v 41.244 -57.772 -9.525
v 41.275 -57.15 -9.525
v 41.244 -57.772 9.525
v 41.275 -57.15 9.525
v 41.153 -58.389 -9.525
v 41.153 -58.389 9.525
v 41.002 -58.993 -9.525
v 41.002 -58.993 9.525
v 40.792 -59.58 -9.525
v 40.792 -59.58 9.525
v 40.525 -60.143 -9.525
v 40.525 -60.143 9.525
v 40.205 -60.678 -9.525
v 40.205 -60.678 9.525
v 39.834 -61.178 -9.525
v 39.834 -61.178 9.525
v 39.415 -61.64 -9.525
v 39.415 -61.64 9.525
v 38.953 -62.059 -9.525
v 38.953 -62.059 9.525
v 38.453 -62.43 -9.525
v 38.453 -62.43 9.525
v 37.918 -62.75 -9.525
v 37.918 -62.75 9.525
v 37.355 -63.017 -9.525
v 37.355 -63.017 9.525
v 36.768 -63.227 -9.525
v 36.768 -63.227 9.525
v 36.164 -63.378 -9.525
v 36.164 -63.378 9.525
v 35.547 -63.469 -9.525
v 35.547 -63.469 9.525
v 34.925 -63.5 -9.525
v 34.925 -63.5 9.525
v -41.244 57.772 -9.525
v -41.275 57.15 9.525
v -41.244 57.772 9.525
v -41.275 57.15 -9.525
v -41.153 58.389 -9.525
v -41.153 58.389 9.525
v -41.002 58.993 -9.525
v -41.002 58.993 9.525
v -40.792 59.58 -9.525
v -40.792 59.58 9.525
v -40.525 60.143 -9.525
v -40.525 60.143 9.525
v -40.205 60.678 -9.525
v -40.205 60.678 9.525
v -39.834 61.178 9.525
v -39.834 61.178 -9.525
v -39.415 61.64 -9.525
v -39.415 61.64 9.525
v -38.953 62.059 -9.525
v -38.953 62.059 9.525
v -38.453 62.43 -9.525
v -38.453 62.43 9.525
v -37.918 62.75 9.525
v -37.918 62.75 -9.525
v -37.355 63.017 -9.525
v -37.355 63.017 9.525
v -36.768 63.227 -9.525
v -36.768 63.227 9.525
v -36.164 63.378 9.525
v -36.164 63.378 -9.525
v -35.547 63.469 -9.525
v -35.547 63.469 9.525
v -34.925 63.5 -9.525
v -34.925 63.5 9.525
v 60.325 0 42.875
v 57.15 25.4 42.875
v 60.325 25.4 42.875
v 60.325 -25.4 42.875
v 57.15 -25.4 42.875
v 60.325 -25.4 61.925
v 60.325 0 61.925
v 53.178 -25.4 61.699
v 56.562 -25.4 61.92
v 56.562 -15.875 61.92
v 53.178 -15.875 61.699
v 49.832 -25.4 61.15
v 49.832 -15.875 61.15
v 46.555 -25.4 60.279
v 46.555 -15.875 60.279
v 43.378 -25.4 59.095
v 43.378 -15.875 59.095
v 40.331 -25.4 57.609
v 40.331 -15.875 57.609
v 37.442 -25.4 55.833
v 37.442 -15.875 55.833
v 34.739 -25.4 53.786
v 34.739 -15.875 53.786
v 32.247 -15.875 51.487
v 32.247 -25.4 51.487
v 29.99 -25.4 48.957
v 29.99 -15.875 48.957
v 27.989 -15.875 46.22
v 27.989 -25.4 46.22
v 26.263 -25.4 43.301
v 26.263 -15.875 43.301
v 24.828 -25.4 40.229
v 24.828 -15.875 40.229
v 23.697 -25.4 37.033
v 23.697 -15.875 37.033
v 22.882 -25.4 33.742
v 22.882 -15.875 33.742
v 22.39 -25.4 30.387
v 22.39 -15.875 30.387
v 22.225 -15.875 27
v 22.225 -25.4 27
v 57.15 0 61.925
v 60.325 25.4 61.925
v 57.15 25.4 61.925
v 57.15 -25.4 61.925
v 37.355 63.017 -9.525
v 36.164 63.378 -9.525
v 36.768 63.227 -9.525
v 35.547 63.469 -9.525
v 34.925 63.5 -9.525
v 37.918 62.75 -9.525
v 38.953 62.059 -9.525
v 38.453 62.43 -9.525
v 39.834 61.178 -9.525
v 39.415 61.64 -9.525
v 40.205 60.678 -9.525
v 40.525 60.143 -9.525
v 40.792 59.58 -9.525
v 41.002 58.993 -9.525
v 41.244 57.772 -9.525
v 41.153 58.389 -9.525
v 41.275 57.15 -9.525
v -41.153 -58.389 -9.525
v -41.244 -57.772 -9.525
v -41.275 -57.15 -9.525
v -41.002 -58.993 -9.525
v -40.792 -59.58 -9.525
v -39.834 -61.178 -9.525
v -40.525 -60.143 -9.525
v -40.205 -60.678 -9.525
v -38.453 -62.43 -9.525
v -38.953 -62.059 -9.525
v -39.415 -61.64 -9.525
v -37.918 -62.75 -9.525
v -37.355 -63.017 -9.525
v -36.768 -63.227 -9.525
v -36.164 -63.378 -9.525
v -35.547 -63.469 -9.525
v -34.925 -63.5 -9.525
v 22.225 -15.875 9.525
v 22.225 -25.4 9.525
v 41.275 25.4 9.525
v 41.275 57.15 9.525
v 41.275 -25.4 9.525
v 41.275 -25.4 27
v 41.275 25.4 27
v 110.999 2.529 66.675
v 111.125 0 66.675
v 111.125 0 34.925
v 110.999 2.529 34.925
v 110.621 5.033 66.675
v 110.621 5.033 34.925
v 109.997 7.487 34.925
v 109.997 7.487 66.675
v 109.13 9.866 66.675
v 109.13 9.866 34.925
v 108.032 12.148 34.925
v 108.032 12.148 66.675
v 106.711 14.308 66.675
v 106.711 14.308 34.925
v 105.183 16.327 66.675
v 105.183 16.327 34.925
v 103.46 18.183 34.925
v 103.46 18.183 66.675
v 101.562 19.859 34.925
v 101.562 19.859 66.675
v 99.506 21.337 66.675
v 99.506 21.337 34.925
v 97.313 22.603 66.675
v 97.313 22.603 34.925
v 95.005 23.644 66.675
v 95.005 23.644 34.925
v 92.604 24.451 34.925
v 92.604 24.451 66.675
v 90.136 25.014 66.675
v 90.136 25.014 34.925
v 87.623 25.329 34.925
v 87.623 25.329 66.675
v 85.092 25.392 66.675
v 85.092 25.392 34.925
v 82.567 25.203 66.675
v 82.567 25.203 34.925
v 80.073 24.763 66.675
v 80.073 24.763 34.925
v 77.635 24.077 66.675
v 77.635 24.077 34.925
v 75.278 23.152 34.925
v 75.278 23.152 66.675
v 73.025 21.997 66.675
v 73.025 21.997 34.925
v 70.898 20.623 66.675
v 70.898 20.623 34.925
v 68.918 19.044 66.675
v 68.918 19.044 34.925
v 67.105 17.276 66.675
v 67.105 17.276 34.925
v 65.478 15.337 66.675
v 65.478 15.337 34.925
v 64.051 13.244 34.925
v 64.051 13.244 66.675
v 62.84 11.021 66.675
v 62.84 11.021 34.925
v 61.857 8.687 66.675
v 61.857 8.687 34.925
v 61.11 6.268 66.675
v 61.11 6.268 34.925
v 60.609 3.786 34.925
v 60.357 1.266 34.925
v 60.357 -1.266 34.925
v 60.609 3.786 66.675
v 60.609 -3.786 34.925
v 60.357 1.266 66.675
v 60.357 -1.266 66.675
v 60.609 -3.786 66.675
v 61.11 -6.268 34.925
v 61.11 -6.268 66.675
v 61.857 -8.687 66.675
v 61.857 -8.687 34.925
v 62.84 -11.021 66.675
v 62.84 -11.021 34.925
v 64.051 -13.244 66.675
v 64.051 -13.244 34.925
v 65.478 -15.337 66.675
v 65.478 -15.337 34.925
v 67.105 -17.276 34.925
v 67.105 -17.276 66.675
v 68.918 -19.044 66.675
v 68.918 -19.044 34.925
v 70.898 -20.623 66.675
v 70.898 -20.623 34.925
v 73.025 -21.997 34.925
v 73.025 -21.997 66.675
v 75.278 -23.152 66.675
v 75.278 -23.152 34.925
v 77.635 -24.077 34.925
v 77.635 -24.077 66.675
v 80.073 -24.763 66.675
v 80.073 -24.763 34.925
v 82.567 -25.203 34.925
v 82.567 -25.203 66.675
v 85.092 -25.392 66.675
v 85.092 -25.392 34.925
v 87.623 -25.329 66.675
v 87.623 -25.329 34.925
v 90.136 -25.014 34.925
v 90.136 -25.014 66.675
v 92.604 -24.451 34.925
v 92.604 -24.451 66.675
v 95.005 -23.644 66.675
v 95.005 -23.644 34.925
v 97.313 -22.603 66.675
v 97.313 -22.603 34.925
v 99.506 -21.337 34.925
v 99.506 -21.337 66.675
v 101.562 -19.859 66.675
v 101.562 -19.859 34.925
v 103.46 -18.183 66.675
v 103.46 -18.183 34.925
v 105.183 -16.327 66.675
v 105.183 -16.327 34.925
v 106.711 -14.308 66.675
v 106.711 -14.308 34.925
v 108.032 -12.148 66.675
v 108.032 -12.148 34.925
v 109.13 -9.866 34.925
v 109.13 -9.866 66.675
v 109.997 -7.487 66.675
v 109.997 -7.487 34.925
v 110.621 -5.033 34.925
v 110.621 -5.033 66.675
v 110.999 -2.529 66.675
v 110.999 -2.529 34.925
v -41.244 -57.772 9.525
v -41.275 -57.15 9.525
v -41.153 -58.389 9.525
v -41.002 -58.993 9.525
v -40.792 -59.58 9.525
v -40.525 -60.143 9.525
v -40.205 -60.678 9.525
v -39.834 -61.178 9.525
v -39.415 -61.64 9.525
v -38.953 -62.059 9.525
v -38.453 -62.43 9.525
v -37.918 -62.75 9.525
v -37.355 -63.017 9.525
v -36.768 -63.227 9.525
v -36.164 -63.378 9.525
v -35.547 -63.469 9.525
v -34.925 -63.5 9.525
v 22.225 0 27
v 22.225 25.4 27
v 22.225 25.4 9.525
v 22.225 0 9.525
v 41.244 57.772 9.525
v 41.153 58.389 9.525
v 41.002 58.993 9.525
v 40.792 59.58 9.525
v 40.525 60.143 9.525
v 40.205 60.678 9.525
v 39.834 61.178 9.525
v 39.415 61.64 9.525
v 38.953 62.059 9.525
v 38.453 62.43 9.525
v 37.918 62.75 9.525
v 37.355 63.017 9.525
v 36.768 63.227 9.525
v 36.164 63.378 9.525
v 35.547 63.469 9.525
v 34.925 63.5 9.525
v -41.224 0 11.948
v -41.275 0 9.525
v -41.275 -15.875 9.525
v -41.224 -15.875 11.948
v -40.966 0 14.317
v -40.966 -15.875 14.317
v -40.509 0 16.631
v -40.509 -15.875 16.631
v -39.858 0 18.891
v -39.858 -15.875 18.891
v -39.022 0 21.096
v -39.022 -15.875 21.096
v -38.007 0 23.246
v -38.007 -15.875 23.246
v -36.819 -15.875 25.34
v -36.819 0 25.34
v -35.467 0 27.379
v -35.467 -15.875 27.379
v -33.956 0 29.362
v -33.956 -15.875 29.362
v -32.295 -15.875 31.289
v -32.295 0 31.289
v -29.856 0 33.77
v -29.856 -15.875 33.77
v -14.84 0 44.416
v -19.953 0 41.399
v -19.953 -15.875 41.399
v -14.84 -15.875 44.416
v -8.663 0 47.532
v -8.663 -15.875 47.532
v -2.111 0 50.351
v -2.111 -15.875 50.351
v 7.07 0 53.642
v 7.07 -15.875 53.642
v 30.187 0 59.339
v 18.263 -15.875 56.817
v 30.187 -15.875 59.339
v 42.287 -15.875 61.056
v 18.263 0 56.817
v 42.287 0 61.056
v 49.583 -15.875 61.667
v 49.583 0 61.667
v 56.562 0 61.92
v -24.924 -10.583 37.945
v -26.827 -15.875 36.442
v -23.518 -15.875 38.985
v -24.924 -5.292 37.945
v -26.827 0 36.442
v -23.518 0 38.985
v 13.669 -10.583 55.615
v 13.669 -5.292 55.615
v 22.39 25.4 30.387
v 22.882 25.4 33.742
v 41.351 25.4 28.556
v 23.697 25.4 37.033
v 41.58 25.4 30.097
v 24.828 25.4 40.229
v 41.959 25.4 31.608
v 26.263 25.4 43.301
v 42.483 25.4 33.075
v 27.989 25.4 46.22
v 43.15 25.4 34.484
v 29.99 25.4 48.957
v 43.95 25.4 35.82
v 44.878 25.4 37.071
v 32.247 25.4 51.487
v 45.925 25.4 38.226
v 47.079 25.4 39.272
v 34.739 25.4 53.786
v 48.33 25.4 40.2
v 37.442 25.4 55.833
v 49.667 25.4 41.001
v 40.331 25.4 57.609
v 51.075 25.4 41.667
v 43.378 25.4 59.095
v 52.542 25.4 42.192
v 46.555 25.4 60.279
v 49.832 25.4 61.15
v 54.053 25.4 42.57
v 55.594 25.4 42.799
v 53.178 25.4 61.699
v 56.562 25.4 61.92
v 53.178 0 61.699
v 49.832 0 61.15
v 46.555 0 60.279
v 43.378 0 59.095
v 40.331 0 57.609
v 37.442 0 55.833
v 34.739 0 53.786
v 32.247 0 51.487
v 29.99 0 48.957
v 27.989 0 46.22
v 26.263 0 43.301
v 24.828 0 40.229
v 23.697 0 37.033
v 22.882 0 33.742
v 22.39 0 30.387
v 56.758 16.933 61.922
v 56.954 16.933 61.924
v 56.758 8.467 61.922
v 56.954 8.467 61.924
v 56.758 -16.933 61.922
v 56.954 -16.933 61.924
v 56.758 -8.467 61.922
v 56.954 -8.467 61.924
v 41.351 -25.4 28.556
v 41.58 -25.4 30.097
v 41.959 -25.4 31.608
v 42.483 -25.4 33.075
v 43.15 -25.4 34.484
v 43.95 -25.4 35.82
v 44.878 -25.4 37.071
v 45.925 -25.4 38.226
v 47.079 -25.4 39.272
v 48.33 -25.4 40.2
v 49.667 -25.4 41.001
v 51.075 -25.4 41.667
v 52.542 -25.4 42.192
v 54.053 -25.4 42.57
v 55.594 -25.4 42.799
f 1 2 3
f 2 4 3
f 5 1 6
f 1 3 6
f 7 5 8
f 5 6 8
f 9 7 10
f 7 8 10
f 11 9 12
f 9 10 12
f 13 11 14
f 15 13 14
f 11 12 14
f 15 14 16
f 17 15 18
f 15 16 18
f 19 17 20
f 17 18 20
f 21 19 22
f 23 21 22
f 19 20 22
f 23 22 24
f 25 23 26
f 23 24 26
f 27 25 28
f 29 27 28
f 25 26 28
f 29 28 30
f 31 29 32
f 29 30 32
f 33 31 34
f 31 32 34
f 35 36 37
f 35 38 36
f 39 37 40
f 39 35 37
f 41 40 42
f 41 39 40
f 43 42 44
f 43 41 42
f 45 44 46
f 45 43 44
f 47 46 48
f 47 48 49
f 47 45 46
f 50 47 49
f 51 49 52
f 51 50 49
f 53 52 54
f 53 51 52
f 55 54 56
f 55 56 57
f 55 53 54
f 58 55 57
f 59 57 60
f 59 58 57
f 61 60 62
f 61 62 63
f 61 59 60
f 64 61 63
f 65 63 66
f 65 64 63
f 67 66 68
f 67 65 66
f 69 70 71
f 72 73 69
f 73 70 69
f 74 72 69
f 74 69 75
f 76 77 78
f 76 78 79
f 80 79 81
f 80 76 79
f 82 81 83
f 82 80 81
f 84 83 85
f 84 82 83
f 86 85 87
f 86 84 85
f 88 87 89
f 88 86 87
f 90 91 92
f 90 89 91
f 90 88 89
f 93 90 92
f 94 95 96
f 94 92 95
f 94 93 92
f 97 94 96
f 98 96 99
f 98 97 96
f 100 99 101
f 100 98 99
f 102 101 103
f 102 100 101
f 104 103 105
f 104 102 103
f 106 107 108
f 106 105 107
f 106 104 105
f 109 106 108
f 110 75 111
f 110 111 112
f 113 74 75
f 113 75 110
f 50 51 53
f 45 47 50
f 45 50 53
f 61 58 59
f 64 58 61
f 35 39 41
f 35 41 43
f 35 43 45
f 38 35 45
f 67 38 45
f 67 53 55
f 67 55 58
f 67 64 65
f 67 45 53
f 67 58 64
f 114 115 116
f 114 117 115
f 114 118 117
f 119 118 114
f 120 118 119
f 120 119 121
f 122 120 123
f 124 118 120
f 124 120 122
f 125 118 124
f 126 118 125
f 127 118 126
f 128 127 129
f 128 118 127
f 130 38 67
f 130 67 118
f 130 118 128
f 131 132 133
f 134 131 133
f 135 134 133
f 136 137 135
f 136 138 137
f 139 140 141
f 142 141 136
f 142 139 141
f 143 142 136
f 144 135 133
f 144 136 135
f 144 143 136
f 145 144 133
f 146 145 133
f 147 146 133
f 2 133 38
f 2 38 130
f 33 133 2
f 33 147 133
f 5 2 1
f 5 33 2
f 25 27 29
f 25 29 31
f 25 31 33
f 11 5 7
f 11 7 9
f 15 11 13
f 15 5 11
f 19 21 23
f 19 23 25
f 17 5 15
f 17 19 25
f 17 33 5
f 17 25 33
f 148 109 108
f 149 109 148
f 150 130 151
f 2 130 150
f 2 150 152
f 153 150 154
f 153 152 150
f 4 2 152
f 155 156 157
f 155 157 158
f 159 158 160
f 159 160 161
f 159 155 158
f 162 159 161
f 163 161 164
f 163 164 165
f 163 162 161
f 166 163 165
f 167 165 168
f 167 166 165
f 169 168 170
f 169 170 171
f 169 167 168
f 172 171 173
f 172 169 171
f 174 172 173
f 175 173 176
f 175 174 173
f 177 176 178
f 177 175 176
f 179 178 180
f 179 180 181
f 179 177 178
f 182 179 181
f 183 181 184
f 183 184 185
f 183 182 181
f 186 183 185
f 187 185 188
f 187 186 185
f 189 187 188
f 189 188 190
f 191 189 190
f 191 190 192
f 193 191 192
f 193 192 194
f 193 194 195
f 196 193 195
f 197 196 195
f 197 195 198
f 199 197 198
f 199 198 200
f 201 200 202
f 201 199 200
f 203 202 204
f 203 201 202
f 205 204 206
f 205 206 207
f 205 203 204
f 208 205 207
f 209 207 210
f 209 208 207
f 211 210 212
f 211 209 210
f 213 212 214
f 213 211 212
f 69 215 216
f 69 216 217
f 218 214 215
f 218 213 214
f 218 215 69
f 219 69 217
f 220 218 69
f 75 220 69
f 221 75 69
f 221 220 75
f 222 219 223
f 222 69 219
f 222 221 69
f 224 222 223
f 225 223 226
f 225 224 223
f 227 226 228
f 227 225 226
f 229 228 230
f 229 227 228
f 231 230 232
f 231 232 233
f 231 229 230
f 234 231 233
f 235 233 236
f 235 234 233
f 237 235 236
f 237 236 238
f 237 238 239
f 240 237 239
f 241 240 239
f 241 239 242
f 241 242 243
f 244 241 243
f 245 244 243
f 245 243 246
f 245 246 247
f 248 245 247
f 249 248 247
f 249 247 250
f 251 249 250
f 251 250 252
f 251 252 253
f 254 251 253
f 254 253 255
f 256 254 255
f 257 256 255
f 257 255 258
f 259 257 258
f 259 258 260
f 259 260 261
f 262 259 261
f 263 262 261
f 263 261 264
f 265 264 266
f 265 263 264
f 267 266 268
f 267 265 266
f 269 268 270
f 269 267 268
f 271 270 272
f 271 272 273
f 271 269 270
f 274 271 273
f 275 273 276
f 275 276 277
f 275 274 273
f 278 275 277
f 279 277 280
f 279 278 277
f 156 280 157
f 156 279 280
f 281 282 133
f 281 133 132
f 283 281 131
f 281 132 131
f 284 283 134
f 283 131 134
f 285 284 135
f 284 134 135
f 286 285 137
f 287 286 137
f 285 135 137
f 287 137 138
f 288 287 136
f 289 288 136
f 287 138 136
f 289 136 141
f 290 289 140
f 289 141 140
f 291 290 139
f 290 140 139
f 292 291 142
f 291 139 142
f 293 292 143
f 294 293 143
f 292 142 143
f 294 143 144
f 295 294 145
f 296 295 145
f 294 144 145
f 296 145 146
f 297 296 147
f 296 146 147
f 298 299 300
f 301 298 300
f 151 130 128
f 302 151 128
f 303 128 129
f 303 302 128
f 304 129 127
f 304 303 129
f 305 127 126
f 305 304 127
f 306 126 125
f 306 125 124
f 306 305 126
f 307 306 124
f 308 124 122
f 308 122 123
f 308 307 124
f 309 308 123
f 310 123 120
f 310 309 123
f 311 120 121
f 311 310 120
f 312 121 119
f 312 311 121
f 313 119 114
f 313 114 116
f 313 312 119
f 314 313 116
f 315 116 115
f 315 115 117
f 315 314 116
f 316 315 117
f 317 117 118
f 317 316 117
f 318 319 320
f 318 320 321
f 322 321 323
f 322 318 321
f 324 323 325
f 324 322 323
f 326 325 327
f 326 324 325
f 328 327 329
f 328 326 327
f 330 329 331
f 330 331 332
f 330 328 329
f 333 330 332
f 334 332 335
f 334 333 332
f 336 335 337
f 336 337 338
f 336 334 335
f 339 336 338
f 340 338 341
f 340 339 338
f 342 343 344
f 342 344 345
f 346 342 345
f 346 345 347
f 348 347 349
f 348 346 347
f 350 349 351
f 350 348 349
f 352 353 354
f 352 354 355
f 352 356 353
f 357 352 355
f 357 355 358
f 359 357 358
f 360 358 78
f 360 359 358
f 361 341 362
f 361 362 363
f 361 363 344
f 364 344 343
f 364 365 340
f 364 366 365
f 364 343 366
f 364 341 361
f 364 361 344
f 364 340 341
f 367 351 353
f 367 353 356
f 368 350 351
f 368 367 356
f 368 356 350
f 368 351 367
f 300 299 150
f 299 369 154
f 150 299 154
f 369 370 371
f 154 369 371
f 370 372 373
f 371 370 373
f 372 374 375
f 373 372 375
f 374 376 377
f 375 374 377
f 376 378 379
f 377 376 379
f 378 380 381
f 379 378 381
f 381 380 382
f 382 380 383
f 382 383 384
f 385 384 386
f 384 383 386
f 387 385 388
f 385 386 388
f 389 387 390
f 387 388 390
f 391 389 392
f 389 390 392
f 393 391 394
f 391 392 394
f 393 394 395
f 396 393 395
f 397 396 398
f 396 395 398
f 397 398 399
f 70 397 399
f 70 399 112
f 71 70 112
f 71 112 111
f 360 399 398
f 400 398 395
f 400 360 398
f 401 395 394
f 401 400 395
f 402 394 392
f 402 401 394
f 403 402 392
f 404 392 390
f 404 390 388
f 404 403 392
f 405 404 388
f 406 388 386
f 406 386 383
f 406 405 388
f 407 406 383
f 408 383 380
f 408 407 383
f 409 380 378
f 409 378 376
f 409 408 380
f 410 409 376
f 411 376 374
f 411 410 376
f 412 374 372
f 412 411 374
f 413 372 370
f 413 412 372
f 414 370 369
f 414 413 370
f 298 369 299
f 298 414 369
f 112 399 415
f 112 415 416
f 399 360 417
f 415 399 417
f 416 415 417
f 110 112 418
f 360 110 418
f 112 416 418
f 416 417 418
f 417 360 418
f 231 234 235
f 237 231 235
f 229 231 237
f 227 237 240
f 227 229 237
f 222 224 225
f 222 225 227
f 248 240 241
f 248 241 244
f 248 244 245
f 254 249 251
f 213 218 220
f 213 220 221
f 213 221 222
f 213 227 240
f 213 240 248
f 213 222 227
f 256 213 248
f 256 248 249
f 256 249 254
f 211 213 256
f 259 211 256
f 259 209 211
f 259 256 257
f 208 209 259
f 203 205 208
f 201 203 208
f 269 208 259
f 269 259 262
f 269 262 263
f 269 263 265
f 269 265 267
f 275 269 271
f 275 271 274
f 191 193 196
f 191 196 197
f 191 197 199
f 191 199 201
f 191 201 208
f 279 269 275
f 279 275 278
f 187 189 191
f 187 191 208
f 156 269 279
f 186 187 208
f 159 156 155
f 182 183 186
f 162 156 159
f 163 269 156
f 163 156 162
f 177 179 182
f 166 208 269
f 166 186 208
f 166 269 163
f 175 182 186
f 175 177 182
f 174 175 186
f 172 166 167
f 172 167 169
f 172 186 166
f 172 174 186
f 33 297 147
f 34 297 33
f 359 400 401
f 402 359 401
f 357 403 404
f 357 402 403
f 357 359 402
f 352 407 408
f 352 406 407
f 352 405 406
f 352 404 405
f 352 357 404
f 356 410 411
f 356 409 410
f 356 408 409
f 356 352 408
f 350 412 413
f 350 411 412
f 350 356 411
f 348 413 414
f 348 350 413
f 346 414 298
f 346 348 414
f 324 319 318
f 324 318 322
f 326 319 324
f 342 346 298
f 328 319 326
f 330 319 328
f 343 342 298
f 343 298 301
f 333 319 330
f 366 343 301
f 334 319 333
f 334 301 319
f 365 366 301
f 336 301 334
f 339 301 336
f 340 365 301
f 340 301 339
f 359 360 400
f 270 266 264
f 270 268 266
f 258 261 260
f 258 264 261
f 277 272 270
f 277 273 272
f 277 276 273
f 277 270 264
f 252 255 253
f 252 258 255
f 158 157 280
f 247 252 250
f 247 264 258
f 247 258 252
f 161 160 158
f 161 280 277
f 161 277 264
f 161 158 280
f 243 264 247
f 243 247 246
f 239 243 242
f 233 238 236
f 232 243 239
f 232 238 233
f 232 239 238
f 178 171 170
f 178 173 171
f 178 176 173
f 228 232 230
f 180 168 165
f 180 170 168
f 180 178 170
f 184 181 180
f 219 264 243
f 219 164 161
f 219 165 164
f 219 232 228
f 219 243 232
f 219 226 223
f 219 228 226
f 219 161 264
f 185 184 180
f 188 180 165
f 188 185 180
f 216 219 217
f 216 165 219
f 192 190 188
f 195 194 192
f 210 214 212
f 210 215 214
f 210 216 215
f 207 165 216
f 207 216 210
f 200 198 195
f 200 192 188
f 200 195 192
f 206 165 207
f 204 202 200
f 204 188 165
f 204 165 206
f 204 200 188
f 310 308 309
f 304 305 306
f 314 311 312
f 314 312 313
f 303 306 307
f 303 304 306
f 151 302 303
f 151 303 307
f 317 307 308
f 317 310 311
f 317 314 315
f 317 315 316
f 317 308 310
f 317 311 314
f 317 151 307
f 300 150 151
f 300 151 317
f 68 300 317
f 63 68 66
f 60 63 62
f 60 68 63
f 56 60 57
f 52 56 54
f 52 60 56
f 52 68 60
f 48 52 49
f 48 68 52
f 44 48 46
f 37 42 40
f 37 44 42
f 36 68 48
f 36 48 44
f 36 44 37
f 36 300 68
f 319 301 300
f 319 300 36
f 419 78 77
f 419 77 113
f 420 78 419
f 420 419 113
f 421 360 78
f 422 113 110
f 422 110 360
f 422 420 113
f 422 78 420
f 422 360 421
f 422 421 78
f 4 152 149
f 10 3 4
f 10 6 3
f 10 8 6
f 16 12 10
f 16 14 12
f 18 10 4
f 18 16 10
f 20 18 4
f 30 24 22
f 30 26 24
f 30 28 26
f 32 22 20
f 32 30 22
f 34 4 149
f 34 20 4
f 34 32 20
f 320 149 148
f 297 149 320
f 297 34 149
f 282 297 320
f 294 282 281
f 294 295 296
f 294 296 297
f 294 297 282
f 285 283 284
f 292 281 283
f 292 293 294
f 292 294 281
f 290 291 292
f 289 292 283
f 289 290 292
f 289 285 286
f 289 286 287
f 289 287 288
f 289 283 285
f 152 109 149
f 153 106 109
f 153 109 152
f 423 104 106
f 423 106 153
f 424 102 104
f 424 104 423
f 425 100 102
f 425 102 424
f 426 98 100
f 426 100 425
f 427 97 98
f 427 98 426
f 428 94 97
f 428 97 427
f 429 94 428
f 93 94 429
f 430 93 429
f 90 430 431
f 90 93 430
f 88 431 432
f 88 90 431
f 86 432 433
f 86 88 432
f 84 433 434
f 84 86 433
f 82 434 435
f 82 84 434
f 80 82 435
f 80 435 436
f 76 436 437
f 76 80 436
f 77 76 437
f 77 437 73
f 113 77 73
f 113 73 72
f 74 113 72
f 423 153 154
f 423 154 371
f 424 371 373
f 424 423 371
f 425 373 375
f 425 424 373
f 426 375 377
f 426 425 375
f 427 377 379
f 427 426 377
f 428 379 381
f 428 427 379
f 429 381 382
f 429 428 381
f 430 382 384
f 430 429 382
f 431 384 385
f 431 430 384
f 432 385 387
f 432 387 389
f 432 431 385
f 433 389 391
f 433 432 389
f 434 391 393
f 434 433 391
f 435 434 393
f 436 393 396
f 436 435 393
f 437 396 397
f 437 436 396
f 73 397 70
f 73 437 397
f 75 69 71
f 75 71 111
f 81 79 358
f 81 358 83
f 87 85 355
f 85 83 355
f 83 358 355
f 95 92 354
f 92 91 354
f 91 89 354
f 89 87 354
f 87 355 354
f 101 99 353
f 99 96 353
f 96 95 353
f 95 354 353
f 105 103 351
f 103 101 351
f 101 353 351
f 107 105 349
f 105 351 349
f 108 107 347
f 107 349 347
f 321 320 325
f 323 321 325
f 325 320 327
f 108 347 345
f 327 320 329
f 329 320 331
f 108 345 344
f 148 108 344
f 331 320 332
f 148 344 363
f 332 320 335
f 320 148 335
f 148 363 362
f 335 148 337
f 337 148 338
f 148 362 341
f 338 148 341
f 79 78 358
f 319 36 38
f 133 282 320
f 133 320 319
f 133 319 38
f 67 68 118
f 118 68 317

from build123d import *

# Parameters (mm, degrees)
F1_DEPTH = 63.5
F2_DEPTH = 25.4
F3_DEPTH = 15.875
F5_R     = 6.35


with BuildPart() as f1:
    # F0 (on Front) → F1 (new body, symmetric)
    with BuildSketch(Plane.XZ):
        Polygon((22.225, 9.525), (-41.275, 9.525), (-41.275, -9.525), (41.275, -9.525), (41.275, 9.525), align=None)
    extrude(amount=F1_DEPTH, both=True)

    # F0 (on Front) → F2 (join, symmetric)
    with BuildSketch(Plane.XZ):
        with BuildLine():
            Line((22.225, 27.0002), (22.225, 9.525))
            Line((22.225, 9.525), (41.275, 9.525))
            Line((41.275, 9.525), (41.275, 27.0002))
            ThreePointArc((41.275, 27.0002), (45.92468, 38.22552), (57.15, 42.8752))
            Line((57.15, 42.8752), (60.325, 42.8752))
            Line((60.325, 42.8752), (60.325, 61.9252))
            Line((60.325, 61.9252), (57.15, 61.9252))
            add(Edge.make_bspline(
                [(56.561753, 61.920246), (56.758357, 61.922352), (56.954443, 61.924004), (57.15, 61.9252)],
                knots=[110.946127, 110.946127, 110.946127, 110.946127, 111.504536, 111.504536, 111.504536, 111.504536], degree=3))
            ThreePointArc((56.561753, 61.920246), (32.247187, 51.487044), (22.225, 27.0002))
        make_face()
    extrude(amount=F2_DEPTH, both=True)

    # F0 (on Front) → F3 (join)
    with BuildSketch(Plane.XZ):
        with BuildLine():
            add(Edge.make_bspline(
                [(-41.275, 9.525), (-42.026804, 43.115073), (17.499926, 61.501674), (56.561753, 61.920246)],
                knots=[0, 0, 0, 0, 110.946127, 110.946127, 110.946127, 110.946127], degree=3))
            Line((-41.275, 9.525), (22.225, 9.525))
            Line((22.225, 9.525), (22.225, 27.0002))
            ThreePointArc((22.225, 27.0002), (32.247187, 51.487044), (56.561753, 61.920246))
        make_face()
    extrude(amount=F3_DEPTH)

    # F0 (on Front) → F4 (revolve)
    with BuildSketch(Plane.XZ):
        Polygon((85.725, 66.675), (85.725, 61.9252), (85.725, 34.925), (111.125, 34.925), (111.125, 66.675), align=None)
    revolve(axis=Axis((85.725, 0, 50.8), (0, 0, 1)))

    # F5
    f5_edges = [f1.edges().sort_by_distance(p)[0] for p in [
        (41.275, 63.5, 0),
        (-41.275, 63.5, 0),
        (-41.275, -63.5, 0),
        (41.275, -63.5, 0),
    ]]
    fillet(f5_edges, radius=F5_R)


solid = f1.part
